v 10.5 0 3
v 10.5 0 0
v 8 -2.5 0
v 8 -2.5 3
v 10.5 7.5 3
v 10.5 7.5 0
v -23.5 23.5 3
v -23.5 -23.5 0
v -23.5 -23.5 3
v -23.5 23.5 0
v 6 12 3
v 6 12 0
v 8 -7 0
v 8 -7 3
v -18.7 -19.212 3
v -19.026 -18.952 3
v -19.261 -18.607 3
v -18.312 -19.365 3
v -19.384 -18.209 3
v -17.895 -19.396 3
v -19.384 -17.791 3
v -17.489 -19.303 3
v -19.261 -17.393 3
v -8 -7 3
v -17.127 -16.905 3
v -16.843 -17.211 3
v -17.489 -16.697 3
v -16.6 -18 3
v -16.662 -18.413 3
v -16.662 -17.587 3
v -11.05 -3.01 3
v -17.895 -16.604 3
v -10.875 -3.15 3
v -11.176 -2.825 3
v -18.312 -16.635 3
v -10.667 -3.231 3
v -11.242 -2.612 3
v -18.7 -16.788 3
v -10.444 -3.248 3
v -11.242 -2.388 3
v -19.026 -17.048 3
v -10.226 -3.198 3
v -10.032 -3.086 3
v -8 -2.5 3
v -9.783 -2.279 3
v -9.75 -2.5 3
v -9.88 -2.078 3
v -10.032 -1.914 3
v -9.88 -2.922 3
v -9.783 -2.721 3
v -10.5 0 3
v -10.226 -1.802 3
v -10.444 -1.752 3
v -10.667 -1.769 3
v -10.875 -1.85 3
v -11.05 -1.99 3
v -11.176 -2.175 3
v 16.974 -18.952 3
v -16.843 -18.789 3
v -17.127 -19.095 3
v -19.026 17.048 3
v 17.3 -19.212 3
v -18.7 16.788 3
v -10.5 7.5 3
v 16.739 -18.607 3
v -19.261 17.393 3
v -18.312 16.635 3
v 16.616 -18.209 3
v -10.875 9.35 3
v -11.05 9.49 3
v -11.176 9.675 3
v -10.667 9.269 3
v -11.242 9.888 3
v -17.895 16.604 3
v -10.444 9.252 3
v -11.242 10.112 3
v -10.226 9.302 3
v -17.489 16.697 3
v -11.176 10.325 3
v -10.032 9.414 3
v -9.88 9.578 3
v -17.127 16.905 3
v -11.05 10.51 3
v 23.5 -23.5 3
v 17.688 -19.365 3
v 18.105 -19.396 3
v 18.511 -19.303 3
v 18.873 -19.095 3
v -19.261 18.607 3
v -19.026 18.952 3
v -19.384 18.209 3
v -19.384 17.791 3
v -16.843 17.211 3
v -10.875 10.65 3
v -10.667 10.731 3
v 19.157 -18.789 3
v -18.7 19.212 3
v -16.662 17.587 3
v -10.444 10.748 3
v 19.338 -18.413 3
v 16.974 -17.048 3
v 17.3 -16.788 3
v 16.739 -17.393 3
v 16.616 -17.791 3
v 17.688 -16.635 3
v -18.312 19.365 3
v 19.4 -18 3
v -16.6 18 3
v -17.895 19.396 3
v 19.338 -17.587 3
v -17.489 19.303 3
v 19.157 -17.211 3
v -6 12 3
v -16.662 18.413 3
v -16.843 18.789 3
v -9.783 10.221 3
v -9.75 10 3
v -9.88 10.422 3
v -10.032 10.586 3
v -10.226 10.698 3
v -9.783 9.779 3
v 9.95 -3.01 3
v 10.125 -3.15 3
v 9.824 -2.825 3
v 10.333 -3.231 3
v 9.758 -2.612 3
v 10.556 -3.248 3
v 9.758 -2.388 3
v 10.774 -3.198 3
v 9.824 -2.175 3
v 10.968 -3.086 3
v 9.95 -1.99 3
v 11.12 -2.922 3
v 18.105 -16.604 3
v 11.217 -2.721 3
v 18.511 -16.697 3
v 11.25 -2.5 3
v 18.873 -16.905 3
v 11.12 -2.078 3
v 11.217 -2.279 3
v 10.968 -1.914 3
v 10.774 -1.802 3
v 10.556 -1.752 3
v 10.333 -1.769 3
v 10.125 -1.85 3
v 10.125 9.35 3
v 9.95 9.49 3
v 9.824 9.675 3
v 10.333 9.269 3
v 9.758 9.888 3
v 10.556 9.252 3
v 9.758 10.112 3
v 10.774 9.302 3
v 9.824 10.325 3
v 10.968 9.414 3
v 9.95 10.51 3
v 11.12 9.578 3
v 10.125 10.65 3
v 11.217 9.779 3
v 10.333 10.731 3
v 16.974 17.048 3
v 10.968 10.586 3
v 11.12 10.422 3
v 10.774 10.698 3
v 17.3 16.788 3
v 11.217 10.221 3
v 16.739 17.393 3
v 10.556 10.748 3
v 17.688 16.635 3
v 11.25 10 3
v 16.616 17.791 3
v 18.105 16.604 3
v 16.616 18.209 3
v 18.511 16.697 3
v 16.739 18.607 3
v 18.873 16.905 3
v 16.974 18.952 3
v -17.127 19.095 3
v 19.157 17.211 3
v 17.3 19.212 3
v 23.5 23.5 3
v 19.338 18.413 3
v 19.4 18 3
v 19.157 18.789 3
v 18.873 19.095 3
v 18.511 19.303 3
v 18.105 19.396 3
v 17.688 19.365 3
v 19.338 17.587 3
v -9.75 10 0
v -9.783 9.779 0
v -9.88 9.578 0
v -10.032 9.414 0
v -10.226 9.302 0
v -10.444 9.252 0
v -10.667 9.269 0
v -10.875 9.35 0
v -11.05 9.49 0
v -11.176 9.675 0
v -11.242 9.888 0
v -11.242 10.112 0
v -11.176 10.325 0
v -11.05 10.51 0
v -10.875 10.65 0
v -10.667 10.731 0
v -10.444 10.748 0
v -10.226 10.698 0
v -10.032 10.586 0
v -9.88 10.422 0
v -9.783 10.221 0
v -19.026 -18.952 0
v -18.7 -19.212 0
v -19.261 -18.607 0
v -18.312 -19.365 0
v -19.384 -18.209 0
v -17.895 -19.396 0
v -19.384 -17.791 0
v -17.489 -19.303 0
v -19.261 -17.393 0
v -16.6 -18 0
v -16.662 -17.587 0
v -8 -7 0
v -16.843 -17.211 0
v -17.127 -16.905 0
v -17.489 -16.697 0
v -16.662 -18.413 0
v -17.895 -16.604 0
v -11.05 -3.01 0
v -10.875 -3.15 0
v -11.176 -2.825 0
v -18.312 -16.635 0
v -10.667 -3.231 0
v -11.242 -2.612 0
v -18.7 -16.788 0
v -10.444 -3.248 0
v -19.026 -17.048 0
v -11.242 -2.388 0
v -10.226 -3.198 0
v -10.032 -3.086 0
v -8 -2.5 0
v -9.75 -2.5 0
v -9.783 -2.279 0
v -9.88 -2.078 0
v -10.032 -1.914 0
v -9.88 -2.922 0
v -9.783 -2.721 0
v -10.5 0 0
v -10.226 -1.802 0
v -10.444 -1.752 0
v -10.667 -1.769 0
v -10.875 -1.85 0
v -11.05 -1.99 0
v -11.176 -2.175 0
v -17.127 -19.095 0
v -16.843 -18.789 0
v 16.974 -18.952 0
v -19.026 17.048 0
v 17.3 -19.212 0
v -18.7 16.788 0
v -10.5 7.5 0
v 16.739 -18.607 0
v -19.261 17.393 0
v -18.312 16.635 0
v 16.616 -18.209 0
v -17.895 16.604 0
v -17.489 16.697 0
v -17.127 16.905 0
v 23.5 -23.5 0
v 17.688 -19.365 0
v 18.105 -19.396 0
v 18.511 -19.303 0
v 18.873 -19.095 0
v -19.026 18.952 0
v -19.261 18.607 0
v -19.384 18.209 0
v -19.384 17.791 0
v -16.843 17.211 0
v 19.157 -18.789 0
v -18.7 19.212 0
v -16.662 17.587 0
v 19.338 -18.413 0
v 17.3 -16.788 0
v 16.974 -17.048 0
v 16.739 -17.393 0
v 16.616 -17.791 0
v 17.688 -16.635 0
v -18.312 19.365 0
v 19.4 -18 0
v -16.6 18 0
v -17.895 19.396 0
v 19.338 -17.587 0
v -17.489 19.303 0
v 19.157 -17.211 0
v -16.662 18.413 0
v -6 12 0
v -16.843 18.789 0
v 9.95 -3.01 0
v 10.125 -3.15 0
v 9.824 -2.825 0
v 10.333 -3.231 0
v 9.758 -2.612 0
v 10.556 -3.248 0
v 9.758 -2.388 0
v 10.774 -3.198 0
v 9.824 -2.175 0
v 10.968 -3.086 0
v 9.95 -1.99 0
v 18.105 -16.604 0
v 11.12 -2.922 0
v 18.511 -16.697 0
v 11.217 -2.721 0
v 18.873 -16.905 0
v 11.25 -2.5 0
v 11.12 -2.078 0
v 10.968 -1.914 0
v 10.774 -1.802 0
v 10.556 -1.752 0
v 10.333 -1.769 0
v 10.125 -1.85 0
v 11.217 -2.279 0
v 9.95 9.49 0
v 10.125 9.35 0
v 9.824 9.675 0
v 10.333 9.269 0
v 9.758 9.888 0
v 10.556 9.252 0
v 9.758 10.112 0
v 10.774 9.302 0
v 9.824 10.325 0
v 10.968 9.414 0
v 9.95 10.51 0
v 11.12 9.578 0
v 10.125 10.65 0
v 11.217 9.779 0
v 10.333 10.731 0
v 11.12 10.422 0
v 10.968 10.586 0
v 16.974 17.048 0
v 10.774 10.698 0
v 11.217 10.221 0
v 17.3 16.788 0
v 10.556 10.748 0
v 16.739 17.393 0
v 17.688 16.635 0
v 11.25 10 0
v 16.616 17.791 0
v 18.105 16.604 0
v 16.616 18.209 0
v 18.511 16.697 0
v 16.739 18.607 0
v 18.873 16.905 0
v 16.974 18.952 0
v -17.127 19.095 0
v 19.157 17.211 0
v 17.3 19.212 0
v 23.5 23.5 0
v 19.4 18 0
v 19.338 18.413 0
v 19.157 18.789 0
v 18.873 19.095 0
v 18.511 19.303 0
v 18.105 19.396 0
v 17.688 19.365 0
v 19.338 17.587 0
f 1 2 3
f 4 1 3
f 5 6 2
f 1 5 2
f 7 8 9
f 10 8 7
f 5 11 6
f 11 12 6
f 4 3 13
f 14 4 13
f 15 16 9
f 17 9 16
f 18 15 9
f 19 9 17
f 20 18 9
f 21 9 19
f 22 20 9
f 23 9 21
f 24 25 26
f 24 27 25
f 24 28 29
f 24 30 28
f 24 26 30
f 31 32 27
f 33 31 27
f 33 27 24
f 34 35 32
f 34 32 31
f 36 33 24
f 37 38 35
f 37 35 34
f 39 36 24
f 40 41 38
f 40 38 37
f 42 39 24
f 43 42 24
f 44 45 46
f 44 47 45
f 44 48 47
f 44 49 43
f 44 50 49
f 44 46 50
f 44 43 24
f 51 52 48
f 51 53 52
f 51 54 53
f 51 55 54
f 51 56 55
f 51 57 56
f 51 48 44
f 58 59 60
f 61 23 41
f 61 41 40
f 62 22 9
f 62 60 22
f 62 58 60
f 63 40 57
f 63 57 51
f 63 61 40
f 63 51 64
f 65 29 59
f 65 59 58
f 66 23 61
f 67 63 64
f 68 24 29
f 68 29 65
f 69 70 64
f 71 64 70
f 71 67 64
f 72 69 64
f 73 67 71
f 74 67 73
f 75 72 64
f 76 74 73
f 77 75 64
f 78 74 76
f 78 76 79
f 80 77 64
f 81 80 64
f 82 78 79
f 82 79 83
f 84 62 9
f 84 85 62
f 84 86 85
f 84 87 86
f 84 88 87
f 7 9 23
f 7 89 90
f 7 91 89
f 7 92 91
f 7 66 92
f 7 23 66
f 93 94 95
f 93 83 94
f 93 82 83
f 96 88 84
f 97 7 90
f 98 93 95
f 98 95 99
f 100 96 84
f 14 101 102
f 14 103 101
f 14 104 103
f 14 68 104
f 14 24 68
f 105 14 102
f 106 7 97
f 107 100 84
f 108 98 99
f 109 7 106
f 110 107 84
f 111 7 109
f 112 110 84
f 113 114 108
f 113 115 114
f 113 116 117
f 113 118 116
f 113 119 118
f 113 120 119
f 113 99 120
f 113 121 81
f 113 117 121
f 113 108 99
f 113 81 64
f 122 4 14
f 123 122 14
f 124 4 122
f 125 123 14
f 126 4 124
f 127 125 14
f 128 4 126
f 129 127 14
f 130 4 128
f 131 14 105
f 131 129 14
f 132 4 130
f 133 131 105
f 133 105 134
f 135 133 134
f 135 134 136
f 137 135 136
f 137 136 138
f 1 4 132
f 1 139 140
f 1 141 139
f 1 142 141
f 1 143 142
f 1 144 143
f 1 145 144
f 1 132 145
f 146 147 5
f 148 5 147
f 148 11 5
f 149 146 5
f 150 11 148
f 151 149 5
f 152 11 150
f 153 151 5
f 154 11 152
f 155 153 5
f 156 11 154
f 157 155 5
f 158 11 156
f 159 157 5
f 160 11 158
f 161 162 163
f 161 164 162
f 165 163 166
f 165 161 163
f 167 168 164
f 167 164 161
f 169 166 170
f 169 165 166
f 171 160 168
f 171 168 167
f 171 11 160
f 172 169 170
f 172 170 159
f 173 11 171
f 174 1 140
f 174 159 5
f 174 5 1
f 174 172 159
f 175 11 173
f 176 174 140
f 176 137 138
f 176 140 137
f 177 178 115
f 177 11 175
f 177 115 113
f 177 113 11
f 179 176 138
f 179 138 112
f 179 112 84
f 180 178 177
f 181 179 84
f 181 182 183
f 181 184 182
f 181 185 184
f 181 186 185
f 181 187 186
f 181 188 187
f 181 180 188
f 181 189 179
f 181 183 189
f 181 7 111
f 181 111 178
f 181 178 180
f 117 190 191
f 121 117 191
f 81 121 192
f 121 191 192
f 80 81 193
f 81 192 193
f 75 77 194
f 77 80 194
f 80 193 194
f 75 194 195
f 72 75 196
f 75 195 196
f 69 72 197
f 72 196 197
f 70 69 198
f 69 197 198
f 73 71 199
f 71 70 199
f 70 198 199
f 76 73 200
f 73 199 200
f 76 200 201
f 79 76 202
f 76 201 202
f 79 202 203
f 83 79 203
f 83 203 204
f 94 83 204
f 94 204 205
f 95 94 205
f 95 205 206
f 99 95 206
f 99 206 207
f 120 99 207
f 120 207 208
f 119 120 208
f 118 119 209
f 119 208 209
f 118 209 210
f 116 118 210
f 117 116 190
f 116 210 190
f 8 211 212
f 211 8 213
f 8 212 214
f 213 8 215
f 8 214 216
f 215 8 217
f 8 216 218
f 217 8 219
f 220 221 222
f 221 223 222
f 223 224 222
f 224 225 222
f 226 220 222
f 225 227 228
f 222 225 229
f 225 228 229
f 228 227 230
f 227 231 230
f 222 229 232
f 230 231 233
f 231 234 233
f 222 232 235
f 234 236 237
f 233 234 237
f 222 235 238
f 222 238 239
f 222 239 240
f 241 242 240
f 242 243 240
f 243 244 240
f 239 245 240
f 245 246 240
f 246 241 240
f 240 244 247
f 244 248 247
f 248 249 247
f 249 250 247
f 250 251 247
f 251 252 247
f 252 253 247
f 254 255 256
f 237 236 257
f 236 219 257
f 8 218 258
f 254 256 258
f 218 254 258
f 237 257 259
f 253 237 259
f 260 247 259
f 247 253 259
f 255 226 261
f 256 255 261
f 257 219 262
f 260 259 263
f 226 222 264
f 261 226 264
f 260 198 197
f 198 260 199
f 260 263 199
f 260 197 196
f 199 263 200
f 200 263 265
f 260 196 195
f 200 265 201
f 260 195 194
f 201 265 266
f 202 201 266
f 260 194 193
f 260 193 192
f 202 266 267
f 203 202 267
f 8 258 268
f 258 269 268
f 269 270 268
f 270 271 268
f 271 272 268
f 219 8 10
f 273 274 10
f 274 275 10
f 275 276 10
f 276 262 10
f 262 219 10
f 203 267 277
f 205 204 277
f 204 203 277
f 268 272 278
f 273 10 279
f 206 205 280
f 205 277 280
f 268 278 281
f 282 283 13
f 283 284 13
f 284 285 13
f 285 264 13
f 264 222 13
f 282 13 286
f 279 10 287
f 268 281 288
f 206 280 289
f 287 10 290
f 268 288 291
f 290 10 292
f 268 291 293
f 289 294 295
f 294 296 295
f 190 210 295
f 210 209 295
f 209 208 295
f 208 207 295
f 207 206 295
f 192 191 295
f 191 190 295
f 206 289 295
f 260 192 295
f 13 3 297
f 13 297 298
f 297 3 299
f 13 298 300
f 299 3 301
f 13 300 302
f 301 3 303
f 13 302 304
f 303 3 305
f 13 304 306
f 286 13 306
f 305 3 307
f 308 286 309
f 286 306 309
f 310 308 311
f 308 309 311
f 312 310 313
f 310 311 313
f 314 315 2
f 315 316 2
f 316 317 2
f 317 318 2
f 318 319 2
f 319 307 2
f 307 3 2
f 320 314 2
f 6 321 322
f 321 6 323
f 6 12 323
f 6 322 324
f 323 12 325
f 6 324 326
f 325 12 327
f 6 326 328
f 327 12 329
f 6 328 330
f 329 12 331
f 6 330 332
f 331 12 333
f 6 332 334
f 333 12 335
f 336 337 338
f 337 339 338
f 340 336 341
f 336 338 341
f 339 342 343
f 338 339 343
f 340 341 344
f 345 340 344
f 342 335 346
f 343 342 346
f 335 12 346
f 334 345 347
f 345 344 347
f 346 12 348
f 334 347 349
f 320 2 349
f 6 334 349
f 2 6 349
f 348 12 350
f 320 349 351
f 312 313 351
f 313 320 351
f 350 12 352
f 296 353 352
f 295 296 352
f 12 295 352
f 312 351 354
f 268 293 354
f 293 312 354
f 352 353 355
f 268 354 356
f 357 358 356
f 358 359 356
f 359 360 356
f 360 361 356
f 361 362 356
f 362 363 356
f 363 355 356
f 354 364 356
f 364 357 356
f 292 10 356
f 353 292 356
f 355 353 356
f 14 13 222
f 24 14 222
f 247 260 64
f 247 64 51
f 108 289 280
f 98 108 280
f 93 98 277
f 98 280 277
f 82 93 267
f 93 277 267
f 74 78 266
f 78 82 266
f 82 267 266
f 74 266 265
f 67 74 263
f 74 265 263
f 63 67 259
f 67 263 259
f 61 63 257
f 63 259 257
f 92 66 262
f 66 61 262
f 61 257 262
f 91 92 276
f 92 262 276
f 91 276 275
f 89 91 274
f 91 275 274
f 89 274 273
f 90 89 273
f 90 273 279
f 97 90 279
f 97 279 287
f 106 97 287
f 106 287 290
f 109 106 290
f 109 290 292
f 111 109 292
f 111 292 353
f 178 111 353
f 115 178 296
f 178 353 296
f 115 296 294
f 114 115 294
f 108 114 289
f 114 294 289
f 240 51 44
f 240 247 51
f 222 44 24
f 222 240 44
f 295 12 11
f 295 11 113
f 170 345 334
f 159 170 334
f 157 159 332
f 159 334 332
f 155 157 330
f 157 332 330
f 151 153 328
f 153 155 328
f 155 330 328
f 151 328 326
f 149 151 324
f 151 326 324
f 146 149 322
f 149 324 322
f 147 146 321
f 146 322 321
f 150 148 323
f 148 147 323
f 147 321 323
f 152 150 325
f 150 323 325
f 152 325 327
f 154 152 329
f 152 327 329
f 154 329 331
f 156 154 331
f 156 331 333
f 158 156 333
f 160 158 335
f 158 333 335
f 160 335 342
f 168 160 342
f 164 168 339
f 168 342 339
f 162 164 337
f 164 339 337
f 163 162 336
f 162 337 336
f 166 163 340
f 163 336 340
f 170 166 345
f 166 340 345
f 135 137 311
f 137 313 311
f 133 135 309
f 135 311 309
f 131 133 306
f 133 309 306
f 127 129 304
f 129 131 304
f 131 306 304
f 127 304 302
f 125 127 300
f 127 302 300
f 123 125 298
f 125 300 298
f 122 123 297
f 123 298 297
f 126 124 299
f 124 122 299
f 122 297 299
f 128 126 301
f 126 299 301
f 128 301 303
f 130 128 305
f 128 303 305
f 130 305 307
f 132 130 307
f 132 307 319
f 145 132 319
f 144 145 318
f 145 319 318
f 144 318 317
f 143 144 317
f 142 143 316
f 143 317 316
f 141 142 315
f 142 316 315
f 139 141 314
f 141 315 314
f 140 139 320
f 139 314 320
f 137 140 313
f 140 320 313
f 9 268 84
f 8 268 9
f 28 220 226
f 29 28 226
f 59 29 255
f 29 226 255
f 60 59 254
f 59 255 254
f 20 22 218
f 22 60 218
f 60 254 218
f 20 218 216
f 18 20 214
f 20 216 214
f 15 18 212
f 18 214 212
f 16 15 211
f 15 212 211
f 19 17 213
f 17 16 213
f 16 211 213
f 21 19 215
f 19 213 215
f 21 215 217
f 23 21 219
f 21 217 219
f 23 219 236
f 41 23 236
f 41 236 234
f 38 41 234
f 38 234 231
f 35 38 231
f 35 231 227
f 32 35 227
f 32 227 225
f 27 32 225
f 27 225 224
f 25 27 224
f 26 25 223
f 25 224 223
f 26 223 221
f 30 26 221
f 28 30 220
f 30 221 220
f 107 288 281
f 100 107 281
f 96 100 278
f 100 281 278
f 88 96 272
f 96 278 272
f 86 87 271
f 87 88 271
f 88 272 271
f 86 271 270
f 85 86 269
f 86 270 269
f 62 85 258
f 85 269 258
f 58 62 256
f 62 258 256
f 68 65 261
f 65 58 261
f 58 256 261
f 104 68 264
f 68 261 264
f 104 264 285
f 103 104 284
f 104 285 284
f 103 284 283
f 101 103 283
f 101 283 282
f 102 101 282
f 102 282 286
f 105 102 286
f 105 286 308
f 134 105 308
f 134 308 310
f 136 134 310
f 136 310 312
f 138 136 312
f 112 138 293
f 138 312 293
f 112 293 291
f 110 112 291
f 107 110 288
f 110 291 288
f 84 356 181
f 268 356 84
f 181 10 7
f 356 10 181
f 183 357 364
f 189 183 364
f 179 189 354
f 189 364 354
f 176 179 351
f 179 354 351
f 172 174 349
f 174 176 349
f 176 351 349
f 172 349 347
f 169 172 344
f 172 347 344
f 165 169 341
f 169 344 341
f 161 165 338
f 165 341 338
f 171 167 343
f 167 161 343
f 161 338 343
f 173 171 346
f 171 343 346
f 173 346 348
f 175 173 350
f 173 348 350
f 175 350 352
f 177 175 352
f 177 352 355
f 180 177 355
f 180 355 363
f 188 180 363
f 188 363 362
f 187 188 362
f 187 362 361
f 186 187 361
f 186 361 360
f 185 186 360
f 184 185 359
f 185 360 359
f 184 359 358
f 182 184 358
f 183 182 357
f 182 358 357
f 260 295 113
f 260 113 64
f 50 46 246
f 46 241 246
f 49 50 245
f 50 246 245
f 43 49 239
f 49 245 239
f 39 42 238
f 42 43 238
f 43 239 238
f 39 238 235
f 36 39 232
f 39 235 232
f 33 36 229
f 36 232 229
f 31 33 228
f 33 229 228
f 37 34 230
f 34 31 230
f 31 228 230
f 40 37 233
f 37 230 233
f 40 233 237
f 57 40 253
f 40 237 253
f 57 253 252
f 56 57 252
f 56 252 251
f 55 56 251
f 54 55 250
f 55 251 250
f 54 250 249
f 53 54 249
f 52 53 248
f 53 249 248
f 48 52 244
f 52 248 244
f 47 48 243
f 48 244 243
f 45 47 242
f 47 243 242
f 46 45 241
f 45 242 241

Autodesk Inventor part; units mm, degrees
ref_plane "YZ Plane" through (0, 0, 0) normal (1, 0, 0) x (0, 1, 0)
ref_plane "XZ Plane" through (0, 0, 0) normal (0, 1, 0) x (-1, 0, 0)
ref_plane "XY Plane" through (0, 0, 0) normal (0, 0, 1) x (1, 0, 0)
sketch "Sketch1" plane through (0, 0, 0) normal (0, 0, 1) x (1, 0, 0)
  circle A0 centre (-10.5, 10) radius 0.75
  circle A1 centre (-10.5, -2.5) radius 0.75
  circle A2 centre (10.5, 10) radius 0.75
  circle A3 centre (10.5, -2.5) radius 0.75
  line L0 (6, 12) -> (10.5, 7.5)
  line L1 (10.5, 7.5) -> (10.5, 0)
  line L2 (0, 15.2771) -> (0, -20.9272) construction
  line L3 (10.5, 0) -> (8, -2.5)
  line L4 (8, -2.5) -> (8, -7)
  line L5 (-6, 12) -> (-10.5, 7.5)
  line L6 (-10.5, 7.5) -> (-10.5, 0)
  line L7 (-10.5, 0) -> (-8, -2.5)
  line L8 (-8, -2.5) -> (-8, -7)
  line L9 (8, -7) -> (-8, -7)
  line L10 (23.5, 23.5) -> (23.5, -23.5)
  line L11 (23.5, -23.5) -> (-23.5, -23.5)
  line L12 (-23.5, -23.5) -> (-23.5, 23.5)
  line L13 (-23.5, 23.5) -> (23.5, 23.5)
  line L14 (6, 12) -> (-6, 12)
  line L15 (12.5, 12.5) -> (12.5, -12.5) construction
  line L16 (-12.5, -12.5) -> (-12.5, 12.5) construction
  line L17 (12.5, -12.5) -> (23.5, -23.5) construction
  line L18 (12.5, 12.5) -> (23.5, 23.5) construction
  line L19 (-12.5, 12.5) -> (-23.5, 23.5) construction
  line L20 (-12.5, -12.5) -> (-23.5, -23.5) construction
  circle A4 centre (18, -18) radius 1.4
  circle A5 centre (18, 18) radius 1.4
  circle A6 centre (-18, 18) radius 1.4
  circle A7 centre (-18, -18) radius 1.4
  line L21 (12.5, 12.5) -> (-12.5, -12.5) construction
  line L22 (12.5, -12.5) -> (-12.5, 12.5) construction
  point P0 (0, 0)
  point P1 (0, 0)
  point P2 (0, 0)
  point P3 (-8.25, 9.75)
  point P4 (0, 0)
  point P5 (0, 0)
  dimension "d2" = 1.5
  dimension "d5" = 1.5
  dimension "d8" = 1.5
  dimension "d11" = 1.5
  dimension "d48" = 2.8
  dimension "d49" = 2.8
  dimension "d50" = 2.8
  dimension "d51" = 2.8
  dimension "d63" = 15.5564
  dimension "d64" = 7.7782
  dimension "d66" = 7.7782
  dimension "d67" = 7.7782
  dimension "d68" = 47
extrude "Extrusion1" add sketch "Sketch1" along normal blind 3
equation "\"d64\" = 0.5 * d63"
equation "\"d66\" = d64"
equation "\"d67\" = d64"
properties part number "Camera-Holder_Mount"
